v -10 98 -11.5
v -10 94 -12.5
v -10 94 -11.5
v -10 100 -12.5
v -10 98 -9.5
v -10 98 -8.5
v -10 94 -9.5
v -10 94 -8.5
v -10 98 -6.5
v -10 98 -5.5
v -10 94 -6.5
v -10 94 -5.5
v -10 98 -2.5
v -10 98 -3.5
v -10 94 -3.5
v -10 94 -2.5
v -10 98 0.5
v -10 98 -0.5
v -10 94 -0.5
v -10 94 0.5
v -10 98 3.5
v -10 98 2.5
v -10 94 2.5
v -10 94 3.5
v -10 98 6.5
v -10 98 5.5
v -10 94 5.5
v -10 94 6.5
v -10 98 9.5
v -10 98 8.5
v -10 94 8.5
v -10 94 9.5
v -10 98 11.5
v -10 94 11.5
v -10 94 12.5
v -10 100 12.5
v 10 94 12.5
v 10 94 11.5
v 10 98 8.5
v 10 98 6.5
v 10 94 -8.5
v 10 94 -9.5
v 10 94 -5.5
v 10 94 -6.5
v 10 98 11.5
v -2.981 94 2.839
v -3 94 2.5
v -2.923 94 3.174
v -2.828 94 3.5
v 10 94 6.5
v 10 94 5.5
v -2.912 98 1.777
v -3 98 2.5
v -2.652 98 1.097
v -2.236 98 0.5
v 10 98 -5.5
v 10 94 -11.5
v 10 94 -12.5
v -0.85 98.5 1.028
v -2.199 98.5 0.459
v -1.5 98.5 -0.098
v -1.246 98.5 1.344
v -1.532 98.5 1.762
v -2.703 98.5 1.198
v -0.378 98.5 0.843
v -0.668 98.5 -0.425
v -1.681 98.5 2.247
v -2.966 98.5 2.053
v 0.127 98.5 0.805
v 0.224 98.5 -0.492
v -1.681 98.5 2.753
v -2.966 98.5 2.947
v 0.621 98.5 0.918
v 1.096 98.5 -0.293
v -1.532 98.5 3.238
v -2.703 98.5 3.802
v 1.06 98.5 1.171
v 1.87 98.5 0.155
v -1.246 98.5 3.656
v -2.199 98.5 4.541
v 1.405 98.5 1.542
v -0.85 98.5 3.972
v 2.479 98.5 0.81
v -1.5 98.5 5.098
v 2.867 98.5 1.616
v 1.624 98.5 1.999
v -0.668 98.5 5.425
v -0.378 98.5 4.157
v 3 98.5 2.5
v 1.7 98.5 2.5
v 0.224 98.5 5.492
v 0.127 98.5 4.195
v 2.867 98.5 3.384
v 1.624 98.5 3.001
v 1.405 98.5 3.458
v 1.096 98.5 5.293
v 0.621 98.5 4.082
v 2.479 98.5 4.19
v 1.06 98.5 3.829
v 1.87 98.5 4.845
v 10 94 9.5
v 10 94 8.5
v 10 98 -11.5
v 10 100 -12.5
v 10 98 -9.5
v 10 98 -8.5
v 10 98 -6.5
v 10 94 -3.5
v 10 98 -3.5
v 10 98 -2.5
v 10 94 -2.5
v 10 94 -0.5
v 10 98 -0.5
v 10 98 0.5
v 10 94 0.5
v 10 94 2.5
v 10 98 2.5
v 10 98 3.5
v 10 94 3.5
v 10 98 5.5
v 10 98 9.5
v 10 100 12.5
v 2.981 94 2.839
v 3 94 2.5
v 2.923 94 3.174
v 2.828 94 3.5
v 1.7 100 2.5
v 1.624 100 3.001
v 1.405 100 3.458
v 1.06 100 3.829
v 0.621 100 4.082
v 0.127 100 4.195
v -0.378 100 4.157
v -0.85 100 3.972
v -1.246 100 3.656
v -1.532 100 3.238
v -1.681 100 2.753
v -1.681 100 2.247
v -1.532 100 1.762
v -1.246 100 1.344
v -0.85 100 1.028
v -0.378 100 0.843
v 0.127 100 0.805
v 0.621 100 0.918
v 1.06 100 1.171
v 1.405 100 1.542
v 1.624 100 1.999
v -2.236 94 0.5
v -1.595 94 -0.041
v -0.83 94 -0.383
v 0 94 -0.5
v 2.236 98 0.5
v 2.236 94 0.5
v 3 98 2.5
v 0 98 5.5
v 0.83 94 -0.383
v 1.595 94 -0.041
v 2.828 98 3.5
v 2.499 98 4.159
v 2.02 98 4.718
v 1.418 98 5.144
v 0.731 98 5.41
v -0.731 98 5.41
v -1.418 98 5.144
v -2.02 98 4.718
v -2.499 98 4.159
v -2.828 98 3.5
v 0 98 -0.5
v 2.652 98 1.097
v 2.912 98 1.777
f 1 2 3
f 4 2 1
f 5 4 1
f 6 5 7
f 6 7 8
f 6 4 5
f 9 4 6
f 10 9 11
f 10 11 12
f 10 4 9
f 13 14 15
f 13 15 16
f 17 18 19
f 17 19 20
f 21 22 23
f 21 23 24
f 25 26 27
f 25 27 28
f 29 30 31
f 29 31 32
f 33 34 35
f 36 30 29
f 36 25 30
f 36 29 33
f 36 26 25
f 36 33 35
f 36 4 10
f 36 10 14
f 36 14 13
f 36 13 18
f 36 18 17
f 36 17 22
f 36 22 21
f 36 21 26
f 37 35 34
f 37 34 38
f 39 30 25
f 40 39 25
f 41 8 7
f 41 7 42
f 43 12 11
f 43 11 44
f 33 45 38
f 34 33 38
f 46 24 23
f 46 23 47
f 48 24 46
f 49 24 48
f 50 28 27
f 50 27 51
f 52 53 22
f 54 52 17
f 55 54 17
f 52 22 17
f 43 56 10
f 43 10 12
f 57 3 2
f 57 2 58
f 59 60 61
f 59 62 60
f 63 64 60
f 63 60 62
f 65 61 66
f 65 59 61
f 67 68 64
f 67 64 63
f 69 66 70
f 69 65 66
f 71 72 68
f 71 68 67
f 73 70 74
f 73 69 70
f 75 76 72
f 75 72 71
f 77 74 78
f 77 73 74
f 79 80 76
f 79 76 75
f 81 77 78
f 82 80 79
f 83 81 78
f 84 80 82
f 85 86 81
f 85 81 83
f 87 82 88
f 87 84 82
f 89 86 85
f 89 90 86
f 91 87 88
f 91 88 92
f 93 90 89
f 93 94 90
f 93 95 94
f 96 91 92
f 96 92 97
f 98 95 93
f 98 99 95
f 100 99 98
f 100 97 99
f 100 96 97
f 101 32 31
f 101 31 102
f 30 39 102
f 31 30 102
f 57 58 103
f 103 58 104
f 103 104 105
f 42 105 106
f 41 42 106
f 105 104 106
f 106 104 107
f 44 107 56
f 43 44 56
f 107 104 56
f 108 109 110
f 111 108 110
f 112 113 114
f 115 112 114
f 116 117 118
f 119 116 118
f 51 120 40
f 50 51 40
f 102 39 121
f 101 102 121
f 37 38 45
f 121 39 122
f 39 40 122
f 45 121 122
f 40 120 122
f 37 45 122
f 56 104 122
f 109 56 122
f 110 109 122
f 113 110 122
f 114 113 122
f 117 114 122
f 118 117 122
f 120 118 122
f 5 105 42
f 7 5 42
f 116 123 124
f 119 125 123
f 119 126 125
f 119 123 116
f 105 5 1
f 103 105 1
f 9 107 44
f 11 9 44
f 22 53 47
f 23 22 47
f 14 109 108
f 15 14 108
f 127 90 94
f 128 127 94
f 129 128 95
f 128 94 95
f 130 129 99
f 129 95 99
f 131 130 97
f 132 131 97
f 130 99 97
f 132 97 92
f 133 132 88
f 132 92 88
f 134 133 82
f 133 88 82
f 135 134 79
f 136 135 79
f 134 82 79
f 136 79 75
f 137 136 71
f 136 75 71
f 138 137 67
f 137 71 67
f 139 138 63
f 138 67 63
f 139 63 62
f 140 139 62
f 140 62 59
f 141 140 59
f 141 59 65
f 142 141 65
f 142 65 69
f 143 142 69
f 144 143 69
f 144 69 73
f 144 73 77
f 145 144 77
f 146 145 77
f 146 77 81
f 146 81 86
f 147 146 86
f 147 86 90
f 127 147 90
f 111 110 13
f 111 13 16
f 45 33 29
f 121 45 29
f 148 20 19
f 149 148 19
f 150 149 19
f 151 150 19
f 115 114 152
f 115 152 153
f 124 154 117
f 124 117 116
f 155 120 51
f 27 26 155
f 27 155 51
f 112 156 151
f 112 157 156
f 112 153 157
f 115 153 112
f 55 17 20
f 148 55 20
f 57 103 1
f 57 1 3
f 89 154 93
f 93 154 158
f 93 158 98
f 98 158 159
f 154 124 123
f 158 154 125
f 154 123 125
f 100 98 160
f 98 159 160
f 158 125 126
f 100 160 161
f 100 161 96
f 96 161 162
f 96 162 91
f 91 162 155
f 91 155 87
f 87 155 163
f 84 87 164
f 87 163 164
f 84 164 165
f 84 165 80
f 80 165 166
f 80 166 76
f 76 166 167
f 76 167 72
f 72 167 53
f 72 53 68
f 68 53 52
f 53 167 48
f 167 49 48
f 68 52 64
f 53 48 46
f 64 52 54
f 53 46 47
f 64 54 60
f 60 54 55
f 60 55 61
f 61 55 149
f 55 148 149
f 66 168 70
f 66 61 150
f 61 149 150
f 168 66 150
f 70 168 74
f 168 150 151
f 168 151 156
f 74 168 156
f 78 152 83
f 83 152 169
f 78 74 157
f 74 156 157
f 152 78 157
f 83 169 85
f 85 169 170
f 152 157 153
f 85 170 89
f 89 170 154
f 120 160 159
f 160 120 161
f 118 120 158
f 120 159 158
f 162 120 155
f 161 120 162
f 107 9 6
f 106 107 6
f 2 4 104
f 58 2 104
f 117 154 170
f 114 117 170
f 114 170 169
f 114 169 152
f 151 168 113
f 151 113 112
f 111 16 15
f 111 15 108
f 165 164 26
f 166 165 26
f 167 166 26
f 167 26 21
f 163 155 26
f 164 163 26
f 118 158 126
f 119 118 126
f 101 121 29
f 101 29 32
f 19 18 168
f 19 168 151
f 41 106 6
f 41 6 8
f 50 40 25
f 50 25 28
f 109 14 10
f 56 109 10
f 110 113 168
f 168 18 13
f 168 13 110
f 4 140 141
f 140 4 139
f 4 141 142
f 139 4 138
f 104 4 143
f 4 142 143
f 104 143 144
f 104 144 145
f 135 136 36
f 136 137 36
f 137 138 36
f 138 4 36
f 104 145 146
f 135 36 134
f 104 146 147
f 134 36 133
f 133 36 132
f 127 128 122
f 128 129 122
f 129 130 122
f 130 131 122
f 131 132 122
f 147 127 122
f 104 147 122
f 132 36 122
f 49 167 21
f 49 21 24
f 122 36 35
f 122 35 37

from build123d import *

# Parameters (mm, degrees)
SKETCH_W            = 20
SKETCH_H            = 25
PAD_DEPTH           = 6
SKETCH001_R         = 1.7
POCKET_DEPTH        = 10
SKETCH002_W         = 2
SKETCH002_H         = 4
POCKET001_DEPTH     = 25
LINEARPATTERN_COUNT = 8
LINEARPATTERN_PITCH = 3
SKETCH003_R         = 3
POCKET002_DEPTH     = 4.5


with BuildPart() as part:
    # Sketch → Pad (new body)
    with BuildSketch(Plane.XZ):
        Rectangle(SKETCH_W, SKETCH_H)
    extrude(amount=PAD_DEPTH)

    # Sketch001 (on Face6 of Pad) → Pocket (cut)
    with BuildSketch(Plane.XZ.offset(6)):
        with Locations((0, 2.5)):
            Circle(SKETCH001_R)
    extrude(amount=-POCKET_DEPTH, mode=Mode.SUBTRACT)

    # Sketch002 (on Face2 of Pocket) → Pocket001 (cut)
    with BuildSketch(Plane(origin=(-10, 0, 0), x_dir=(0, 0, -1), z_dir=(-1, 0, 0))):
        with Locations((-10.5, 4)):
            Rectangle(SKETCH002_W, SKETCH002_H)
    pocket001 = extrude(amount=-POCKET001_DEPTH, mode=Mode.SUBTRACT)

    # LinearPattern: Pocket001 ×8
    with Locations(*[(0, 0, -i * LINEARPATTERN_PITCH) for i in range(1, LINEARPATTERN_COUNT)]):
        add(pocket001, mode=Mode.SUBTRACT)

    # Sketch003 (on Face40 of LinearPattern) → Pocket002 (cut)
    with BuildSketch(Plane.XZ.offset(6)):
        with Locations((0, 2.5)):
            Circle(SKETCH003_R)
    extrude(amount=-POCKET002_DEPTH, mode=Mode.SUBTRACT)


with BuildPart() as part_1:
    # Body002 placement: moved
    add(part.part.moved(Location((0, 100, 0))))


solid = part_1.part
